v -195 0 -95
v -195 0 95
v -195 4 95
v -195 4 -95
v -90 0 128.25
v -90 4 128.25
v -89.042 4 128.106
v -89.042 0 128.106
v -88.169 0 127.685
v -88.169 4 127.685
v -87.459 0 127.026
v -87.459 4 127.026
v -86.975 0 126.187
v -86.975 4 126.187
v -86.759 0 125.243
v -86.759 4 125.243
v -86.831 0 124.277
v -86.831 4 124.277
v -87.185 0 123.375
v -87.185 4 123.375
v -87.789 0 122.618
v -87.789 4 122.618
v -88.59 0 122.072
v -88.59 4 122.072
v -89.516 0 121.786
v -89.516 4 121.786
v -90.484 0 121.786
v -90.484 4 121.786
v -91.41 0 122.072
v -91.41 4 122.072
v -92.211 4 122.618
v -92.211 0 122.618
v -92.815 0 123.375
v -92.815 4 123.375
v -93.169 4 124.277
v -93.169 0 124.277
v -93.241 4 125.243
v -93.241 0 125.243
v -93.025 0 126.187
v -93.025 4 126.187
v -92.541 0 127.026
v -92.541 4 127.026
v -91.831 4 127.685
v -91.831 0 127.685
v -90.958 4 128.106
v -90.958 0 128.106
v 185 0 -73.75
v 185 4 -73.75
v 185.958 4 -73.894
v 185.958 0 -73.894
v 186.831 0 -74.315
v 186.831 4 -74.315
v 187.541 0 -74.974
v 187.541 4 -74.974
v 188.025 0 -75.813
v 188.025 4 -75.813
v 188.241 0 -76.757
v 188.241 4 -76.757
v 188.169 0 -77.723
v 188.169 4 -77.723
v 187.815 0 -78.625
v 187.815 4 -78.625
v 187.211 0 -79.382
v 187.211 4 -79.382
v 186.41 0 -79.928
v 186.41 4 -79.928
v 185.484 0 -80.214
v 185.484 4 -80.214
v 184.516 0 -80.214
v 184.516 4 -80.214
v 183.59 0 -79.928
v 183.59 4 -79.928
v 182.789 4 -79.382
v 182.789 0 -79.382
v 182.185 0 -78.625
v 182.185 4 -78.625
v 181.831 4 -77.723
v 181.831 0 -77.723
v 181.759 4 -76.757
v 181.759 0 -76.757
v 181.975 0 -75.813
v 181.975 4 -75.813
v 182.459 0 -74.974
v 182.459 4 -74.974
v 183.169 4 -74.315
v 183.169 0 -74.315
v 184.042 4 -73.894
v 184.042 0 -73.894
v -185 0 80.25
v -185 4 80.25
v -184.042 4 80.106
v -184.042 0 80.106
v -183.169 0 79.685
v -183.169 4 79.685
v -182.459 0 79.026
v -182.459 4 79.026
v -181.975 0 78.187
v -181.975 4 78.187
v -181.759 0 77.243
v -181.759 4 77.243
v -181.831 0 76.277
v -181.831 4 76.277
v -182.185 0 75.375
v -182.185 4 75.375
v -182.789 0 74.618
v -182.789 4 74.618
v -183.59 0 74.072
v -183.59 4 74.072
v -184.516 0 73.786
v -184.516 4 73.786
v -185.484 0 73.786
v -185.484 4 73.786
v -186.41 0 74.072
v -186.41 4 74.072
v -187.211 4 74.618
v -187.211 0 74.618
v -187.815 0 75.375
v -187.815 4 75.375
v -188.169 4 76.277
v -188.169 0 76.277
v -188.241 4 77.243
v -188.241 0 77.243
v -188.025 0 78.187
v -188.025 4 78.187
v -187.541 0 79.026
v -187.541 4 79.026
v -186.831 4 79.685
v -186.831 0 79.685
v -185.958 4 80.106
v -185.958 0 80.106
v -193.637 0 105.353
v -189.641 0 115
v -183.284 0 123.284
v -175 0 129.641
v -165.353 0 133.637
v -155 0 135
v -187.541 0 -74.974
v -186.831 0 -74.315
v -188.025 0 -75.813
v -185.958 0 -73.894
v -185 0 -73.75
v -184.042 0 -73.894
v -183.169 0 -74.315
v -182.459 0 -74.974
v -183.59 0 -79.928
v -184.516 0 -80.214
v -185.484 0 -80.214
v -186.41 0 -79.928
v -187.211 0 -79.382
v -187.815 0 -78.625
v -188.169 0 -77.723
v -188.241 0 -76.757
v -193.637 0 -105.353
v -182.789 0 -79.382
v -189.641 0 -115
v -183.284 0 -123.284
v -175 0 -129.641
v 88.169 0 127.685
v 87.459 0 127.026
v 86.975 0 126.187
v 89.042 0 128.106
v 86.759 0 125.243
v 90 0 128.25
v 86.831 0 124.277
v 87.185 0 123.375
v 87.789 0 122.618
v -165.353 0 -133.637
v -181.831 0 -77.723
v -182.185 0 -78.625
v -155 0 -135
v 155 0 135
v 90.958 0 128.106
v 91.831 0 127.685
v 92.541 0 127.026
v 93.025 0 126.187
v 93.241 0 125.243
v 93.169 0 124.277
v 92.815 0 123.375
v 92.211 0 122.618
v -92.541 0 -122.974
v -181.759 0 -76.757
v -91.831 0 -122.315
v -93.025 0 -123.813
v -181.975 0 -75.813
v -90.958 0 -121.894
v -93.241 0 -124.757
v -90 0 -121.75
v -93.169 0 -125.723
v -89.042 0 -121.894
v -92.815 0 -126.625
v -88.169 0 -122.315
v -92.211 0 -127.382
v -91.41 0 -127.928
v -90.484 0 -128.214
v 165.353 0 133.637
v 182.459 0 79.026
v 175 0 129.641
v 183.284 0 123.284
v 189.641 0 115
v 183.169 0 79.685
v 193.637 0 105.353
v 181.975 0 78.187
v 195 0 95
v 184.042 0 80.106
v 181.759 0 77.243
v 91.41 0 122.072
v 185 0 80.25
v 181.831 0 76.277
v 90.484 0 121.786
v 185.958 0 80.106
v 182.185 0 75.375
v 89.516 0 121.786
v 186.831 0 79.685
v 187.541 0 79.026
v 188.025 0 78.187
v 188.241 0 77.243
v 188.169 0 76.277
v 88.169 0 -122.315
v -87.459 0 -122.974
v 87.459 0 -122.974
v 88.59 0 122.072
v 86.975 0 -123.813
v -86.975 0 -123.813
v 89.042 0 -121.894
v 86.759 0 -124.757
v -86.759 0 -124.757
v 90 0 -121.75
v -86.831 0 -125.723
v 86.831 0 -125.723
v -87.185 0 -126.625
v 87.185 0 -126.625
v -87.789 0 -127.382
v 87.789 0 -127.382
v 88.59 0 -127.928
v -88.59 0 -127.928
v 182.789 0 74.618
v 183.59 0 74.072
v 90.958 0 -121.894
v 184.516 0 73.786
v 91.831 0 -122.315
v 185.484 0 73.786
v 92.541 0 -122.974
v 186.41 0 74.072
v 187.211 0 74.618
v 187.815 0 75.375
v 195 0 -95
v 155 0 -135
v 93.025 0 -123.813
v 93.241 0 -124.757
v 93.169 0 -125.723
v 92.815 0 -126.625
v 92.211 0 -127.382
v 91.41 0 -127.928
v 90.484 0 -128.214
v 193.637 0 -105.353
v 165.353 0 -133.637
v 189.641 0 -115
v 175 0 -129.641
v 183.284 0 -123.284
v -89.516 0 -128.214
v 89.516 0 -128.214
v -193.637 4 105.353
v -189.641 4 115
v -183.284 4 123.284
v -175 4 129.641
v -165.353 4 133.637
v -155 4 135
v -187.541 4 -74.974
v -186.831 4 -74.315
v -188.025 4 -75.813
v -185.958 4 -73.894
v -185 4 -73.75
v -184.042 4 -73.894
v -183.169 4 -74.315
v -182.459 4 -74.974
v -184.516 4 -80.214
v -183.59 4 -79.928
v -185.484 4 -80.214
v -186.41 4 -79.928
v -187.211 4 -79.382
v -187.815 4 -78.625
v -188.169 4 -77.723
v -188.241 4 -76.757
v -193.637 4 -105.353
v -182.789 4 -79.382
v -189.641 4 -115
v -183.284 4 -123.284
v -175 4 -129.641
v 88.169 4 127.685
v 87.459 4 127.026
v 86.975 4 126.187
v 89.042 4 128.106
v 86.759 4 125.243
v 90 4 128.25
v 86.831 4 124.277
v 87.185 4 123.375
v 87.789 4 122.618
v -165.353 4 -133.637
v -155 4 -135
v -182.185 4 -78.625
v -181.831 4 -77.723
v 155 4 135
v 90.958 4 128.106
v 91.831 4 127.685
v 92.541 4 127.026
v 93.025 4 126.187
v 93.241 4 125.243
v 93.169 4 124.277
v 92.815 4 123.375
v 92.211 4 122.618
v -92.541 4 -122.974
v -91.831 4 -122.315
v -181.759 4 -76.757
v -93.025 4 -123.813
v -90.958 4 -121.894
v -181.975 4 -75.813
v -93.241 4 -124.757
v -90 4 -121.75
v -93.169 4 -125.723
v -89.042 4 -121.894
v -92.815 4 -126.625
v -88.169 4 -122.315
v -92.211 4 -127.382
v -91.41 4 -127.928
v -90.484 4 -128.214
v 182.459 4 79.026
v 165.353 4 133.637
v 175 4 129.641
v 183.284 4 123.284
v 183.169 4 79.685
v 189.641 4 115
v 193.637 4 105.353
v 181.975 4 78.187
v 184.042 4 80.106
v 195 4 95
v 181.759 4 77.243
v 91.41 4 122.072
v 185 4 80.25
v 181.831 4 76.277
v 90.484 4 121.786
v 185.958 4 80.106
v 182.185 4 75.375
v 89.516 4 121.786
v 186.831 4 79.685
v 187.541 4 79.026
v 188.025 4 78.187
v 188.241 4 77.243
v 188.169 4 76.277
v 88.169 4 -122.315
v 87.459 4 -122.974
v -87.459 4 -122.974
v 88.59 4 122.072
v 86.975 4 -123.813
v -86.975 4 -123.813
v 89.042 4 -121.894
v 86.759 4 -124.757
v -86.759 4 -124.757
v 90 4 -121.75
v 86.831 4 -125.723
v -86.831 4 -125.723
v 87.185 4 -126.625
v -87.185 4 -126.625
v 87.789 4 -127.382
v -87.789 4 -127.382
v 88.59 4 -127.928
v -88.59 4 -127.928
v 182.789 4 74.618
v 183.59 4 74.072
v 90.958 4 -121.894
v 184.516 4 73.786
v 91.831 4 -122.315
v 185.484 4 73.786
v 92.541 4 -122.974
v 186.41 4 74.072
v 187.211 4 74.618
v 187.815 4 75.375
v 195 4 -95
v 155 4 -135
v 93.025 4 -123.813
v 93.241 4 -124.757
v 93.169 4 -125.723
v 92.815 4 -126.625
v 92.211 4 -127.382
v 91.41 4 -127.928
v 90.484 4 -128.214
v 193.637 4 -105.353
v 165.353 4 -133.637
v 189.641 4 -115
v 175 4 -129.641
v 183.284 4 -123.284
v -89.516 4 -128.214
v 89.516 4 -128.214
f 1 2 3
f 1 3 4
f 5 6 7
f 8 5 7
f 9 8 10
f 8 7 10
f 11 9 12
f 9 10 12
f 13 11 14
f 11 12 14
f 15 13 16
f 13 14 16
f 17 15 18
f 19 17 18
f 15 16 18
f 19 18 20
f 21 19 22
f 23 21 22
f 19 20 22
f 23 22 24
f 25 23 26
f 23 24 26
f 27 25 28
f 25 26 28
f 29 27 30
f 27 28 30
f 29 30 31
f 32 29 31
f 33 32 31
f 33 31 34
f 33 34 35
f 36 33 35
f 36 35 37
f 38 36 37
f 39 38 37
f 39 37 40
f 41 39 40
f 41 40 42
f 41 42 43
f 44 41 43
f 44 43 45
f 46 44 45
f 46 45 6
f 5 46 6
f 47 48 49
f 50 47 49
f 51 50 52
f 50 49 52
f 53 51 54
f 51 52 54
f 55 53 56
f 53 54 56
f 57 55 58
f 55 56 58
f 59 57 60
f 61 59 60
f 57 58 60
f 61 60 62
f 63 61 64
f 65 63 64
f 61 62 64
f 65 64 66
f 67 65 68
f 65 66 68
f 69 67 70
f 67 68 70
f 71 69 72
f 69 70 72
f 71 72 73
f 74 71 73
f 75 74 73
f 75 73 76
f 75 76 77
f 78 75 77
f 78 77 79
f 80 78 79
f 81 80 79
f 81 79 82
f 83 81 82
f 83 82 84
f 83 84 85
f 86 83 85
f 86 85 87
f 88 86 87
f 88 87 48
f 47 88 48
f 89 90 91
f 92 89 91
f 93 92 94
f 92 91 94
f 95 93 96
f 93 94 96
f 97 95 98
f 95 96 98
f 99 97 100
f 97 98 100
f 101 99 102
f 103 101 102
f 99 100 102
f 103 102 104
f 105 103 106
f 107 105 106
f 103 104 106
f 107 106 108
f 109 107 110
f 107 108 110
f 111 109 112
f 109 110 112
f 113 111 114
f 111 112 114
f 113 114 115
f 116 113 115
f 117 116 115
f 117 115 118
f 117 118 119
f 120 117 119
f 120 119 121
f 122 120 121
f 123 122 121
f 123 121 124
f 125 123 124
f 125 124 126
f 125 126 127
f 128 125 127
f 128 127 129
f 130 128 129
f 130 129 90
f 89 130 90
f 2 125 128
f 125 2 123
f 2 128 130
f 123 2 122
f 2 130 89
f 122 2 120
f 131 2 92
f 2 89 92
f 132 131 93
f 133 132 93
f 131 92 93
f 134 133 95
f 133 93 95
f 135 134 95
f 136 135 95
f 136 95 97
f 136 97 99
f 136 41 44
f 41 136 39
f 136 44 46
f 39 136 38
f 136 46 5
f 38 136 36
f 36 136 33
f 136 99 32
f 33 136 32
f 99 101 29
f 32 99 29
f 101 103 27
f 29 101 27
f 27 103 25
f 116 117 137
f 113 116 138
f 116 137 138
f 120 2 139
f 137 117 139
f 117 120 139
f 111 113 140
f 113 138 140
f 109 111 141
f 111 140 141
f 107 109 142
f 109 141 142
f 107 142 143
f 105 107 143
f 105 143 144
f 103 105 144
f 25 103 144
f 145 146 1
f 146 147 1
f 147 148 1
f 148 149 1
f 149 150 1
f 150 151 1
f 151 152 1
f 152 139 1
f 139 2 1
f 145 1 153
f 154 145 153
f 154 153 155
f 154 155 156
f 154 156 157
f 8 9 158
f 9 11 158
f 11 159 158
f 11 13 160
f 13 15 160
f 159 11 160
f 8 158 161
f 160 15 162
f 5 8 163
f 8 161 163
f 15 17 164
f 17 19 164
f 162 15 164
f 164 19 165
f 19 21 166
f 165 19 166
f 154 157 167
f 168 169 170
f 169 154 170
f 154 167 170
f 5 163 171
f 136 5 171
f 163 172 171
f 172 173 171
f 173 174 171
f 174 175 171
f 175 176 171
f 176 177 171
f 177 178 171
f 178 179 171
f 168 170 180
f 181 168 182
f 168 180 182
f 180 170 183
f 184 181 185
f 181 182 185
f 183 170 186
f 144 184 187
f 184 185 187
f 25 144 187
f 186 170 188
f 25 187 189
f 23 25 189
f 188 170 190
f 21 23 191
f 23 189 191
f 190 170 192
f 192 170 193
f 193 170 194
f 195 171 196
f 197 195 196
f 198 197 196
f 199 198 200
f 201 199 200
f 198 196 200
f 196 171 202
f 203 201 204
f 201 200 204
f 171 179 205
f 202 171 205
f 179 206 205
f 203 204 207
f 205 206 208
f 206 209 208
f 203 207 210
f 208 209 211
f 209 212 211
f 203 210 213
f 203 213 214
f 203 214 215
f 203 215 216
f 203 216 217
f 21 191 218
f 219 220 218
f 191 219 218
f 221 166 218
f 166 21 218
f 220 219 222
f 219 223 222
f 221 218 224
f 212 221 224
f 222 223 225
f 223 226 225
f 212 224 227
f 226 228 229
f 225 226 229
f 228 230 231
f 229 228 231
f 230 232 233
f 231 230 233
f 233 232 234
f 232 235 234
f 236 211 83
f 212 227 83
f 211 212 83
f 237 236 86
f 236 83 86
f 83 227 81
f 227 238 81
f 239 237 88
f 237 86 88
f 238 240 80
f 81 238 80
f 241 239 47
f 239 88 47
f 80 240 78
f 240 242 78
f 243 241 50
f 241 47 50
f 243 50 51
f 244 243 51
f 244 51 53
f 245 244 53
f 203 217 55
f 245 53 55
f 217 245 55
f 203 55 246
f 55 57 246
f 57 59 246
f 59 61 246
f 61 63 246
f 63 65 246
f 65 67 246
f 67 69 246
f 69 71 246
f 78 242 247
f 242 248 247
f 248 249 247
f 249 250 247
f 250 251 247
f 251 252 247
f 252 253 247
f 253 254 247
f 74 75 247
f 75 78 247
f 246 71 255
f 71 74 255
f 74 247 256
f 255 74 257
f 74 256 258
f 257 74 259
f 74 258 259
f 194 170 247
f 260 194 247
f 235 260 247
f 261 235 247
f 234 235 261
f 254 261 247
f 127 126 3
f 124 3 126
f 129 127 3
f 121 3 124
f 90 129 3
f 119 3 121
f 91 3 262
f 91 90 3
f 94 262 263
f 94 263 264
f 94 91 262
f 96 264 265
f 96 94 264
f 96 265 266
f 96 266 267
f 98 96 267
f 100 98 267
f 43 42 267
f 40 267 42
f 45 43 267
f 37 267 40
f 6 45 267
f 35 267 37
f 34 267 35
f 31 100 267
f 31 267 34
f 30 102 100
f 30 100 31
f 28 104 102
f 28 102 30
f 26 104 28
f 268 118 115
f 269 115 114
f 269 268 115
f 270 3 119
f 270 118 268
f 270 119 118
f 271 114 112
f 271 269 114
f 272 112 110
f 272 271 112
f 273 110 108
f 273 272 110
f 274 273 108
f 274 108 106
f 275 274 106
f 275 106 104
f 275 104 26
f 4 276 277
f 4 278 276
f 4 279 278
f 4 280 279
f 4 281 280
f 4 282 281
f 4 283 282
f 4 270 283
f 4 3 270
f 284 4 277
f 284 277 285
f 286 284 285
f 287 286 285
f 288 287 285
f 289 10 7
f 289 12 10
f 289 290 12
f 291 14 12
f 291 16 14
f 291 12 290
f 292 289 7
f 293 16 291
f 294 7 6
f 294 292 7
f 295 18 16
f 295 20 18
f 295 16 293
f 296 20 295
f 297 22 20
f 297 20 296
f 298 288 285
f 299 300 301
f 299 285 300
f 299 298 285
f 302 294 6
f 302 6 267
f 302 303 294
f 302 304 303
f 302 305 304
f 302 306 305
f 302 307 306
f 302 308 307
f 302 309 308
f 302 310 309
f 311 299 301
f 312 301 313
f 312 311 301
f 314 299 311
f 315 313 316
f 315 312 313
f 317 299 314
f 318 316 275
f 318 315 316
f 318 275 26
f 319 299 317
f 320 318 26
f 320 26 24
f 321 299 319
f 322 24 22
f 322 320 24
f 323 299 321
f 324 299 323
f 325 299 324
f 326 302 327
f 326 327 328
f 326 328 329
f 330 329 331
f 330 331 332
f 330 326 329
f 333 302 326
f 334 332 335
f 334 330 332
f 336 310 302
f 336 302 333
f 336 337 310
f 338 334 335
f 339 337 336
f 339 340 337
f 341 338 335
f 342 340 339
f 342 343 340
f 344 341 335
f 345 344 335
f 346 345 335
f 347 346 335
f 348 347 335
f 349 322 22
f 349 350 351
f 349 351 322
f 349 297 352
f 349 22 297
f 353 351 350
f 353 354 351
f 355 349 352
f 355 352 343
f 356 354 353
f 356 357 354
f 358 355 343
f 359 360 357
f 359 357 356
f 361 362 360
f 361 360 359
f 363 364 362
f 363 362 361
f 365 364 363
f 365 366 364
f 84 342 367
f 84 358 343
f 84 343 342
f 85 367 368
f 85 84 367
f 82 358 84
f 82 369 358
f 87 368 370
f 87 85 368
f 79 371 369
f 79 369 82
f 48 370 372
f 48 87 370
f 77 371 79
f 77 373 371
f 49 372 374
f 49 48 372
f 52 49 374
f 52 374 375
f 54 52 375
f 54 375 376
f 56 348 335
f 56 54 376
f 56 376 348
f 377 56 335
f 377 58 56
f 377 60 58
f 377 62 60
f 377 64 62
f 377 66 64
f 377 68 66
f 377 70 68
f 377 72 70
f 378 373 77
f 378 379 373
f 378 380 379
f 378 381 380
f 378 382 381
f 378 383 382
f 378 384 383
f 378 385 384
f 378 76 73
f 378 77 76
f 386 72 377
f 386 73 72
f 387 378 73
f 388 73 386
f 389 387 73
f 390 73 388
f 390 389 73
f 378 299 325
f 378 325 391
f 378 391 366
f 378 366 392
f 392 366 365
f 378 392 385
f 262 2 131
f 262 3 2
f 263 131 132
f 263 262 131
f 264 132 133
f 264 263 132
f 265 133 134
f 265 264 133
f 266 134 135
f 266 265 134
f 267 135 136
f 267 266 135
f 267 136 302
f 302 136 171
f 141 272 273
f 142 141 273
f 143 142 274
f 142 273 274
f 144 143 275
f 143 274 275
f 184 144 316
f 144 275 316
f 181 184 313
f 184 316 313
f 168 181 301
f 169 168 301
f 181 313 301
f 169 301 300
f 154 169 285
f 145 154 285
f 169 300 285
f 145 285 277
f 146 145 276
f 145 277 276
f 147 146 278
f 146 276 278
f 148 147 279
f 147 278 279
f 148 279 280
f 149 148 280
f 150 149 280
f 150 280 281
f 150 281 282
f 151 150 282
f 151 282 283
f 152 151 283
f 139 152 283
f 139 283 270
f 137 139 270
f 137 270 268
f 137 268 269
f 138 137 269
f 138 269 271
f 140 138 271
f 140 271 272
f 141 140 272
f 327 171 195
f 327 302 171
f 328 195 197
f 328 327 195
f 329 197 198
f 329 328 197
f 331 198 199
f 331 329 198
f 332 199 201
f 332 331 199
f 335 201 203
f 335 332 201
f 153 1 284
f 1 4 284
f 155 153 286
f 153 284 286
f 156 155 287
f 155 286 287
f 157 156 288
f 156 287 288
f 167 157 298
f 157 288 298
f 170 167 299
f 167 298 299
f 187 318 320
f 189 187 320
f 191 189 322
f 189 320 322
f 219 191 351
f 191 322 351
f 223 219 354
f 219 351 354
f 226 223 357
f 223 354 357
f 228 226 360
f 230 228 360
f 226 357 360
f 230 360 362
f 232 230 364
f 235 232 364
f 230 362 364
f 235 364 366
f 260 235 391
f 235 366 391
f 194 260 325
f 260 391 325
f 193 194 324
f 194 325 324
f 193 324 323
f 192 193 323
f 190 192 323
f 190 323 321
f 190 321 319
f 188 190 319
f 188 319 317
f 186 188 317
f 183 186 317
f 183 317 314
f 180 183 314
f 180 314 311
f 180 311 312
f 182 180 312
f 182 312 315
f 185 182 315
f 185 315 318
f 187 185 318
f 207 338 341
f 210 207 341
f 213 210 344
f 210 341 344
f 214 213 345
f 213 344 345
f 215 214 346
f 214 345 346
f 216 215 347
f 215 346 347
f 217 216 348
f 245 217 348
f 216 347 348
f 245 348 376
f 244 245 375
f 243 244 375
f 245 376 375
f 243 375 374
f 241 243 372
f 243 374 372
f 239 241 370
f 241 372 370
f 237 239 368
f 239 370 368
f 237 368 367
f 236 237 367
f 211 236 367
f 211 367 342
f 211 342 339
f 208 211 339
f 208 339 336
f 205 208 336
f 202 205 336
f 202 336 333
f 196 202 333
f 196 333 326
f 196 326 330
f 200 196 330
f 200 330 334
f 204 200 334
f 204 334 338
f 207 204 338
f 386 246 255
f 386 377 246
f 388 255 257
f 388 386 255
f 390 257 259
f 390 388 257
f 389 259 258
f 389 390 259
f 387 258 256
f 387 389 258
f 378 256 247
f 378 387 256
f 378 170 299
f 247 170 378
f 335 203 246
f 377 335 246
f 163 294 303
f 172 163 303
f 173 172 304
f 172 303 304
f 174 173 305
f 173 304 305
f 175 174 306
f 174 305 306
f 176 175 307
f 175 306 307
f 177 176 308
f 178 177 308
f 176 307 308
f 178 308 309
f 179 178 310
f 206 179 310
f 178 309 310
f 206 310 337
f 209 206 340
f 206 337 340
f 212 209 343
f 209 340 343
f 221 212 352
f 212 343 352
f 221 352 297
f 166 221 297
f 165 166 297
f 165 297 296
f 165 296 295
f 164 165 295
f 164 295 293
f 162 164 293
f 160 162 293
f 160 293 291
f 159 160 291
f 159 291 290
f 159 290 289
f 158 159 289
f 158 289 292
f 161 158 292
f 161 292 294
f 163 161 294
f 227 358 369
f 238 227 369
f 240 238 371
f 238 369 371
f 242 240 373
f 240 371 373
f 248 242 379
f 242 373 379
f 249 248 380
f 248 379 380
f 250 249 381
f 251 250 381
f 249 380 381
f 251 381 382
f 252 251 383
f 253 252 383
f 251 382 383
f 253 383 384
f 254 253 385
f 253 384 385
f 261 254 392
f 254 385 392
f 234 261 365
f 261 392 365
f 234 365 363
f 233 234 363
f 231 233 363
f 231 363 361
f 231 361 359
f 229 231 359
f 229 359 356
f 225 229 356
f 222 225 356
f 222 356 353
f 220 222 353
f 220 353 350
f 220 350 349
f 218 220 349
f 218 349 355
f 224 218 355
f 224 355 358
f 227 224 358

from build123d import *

# Parameters (mm, degrees)
SKETCH_1_W          = 390
SKETCH_1_H          = 270
EXTRUDE_1_DEPTH     = 4
FILLET_1_R          = 40
SKETCH_2_R          = 3.25
CUT_EXTRUDE_1_DEPTH = 238.204553076


with BuildPart() as part:
    # 草图1 → 凸台-拉伸1 (new body)
    with BuildSketch(Plane(origin=(0, 0, 0), x_dir=(1, 0, 0), z_dir=(0, 1, 0))):
        Rectangle(SKETCH_1_W, SKETCH_1_H)
    extrude(amount=EXTRUDE_1_DEPTH)

    # 圆角1
    fillet_1_edges = [part.edges().sort_by_distance(p)[0] for p in [
        (195, 2, 135),
        (-195, 2, 135),
        (-195, 2, -135),
        (195, 2, -135),
    ]]
    fillet(fillet_1_edges, radius=FILLET_1_R)

    # 草图2 → 切除-拉伸1 (cut, through all)
    with BuildSketch(Plane(origin=(0, 4, 0), x_dir=(1, 0, 0), z_dir=(0, 1, 0))):
        with Locations(Location((-185, -77, 0), (0, 0, 270))):
            Circle(SKETCH_2_R)
        with Locations(Location((-185, 77, 0), (0, 0, 270))):
            Circle(SKETCH_2_R)
        with Locations(Location((-90, 125, 0), (0, 0, 270))):
            Circle(SKETCH_2_R)
        with Locations(Location((-90, -125, 0), (0, 0, 270))):
            Circle(SKETCH_2_R)
        with Locations(Location((90, -125, 0), (0, 0, 270))):
            Circle(SKETCH_2_R)
        with Locations(Location((185, -77, 0), (0, 0, 270))):
            Circle(SKETCH_2_R)
        with Locations(Location((185, 77, 0), (0, 0, 270))):
            Circle(SKETCH_2_R)
        with Locations(Location((90, 125, 0), (0, 0, 270))):
            Circle(SKETCH_2_R)
    extrude(amount=-CUT_EXTRUDE_1_DEPTH, mode=Mode.SUBTRACT)


solid = part.part
